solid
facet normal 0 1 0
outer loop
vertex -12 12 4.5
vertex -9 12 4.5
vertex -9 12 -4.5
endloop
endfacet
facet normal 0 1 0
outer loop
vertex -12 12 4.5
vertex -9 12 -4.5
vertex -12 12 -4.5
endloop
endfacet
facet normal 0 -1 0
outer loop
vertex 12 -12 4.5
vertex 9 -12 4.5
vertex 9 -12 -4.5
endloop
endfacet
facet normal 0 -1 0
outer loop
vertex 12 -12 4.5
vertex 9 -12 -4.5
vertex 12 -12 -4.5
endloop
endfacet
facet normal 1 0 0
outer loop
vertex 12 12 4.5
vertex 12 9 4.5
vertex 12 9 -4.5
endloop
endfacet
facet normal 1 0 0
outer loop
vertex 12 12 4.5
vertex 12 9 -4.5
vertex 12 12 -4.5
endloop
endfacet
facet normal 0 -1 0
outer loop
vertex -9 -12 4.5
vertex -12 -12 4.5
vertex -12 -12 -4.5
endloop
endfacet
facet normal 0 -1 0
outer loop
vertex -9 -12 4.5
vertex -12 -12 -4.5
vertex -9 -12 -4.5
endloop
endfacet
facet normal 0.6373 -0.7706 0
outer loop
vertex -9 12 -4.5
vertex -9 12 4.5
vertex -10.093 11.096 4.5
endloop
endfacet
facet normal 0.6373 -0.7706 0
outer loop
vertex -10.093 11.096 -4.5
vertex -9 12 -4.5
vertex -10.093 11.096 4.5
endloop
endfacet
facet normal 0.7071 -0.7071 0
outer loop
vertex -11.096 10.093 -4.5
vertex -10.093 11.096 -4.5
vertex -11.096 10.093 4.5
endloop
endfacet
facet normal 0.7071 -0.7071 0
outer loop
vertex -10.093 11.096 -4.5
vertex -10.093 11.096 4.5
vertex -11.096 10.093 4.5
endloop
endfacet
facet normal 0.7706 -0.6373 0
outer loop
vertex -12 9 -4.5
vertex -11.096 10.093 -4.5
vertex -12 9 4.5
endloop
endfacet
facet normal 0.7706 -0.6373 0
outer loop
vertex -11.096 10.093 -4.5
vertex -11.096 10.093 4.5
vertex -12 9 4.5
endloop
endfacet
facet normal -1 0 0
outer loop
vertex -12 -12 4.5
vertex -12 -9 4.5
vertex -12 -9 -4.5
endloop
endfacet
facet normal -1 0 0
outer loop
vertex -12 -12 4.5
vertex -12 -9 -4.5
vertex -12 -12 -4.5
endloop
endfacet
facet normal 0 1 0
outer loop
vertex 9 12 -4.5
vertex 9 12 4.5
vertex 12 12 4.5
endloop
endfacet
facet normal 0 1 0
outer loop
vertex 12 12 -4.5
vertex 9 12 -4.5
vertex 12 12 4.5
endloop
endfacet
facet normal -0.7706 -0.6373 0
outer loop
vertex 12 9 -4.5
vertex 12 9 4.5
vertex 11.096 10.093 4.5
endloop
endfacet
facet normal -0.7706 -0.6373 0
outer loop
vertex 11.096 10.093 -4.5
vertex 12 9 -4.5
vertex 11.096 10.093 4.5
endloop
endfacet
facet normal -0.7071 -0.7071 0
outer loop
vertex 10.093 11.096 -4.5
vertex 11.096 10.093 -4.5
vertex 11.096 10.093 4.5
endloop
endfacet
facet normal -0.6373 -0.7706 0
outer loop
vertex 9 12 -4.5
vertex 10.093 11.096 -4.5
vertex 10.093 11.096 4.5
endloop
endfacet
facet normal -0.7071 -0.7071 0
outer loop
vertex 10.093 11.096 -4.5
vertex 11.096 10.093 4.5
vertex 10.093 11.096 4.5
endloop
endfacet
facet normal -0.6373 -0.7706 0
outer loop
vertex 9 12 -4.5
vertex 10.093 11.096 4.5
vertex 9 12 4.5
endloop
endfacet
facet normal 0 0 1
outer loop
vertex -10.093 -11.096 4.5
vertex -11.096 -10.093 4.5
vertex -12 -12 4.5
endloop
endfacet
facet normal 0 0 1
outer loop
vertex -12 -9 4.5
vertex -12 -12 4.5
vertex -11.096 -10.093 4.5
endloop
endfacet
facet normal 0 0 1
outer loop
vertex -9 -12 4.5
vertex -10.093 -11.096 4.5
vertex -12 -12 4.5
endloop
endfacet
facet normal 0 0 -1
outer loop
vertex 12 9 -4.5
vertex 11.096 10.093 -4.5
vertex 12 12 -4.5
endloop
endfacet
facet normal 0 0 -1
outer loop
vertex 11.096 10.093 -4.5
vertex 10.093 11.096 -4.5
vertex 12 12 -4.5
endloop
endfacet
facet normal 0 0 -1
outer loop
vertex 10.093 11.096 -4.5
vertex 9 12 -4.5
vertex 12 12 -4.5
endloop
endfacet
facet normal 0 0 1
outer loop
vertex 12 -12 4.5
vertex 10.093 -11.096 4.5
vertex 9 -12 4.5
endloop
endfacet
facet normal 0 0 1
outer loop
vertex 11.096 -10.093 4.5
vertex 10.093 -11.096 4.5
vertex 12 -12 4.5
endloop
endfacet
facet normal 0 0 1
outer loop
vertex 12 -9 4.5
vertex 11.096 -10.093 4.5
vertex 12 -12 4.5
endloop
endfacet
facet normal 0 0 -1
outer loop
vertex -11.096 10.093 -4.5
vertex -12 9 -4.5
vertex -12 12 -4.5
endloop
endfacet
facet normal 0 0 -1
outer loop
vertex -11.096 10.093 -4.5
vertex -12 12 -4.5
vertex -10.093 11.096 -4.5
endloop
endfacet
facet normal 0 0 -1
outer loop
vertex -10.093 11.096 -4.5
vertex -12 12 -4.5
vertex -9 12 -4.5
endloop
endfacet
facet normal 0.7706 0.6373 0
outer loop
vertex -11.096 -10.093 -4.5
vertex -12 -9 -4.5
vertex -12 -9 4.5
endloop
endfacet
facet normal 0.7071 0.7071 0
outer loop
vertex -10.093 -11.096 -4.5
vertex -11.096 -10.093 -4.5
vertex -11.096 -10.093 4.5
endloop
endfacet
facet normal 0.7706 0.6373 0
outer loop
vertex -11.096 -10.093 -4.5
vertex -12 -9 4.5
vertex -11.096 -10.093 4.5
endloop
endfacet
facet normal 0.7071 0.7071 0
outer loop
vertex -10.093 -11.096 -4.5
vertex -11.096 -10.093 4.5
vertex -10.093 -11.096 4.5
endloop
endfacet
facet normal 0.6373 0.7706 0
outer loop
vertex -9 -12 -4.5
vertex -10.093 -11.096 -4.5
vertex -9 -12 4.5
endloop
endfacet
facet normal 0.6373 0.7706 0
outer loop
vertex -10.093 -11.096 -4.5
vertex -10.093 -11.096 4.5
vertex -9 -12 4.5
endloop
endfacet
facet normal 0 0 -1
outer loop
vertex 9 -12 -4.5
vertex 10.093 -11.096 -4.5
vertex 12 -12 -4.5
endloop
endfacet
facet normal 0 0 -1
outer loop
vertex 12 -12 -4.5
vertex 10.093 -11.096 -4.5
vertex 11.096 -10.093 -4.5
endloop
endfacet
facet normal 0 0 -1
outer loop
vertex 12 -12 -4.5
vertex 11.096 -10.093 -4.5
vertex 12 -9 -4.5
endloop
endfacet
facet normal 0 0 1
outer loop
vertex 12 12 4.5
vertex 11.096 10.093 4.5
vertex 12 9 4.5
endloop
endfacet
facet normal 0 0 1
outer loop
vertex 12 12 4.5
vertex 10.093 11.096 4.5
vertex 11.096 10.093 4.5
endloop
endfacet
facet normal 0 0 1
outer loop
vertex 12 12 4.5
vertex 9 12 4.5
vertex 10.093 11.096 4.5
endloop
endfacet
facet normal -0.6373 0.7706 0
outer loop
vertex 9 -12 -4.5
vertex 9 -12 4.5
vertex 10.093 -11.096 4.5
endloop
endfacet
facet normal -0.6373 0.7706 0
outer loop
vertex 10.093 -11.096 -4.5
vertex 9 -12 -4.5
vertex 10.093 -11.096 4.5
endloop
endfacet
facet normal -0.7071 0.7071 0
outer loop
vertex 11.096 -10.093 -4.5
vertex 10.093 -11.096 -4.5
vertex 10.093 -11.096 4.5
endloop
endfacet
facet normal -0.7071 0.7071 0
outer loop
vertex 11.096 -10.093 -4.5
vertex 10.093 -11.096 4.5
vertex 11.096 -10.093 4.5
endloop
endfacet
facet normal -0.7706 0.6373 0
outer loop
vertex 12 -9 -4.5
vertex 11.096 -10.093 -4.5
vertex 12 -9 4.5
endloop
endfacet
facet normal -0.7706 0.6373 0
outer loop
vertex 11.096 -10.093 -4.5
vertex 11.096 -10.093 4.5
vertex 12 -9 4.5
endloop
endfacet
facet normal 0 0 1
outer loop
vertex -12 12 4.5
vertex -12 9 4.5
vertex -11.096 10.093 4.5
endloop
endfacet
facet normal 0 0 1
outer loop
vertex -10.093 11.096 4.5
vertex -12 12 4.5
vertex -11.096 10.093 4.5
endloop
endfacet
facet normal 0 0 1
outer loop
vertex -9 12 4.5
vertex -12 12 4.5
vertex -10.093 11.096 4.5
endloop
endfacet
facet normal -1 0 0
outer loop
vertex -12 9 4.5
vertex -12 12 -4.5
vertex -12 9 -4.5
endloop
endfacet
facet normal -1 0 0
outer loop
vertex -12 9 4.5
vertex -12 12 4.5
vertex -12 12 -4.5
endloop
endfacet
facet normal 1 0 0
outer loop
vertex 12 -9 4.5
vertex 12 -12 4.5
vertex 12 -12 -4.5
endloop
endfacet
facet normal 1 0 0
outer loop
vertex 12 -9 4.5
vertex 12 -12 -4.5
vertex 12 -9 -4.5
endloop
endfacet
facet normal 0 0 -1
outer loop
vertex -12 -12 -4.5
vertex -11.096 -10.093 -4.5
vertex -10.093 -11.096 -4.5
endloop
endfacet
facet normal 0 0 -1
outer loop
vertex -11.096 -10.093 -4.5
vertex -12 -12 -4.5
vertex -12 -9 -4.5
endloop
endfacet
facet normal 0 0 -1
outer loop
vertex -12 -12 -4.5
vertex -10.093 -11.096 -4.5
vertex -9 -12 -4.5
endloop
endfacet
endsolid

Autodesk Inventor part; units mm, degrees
ref_plane "YZ Plane" through (0, 0, 0) normal (1, 0, 0) x (0, 1, 0)
ref_plane "XZ Plane" through (0, 0, 0) normal (0, 1, 0) x (-1, 0, 0)
ref_plane "XY Plane" through (0, 0, 0) normal (0, 0, 1) x (1, 0, 0)
sketch "スケッチ1" plane through (8.3334, 12.4721, 4.5) normal (0, 0, 1) x (1, 0, 0)
  circle A0 centre (-8.3334, -12.4721) radius 15
  line L0 (-8.3334, -12.4721) -> (-8.3334, -0.4721)
  line L1 (0.6666, -0.4721) -> (3.6666, -0.4721)
  line L2 (3.6666, -0.4721) -> (-8.3334, -0.4721)
  line L3 (-17.3334, -0.4721) -> (-20.3334, -0.4721)
  line L4 (3.6666, -24.4721) -> (3.6666, -21.4721)
  line L5 (3.6666, -3.4721) -> (3.6666, -0.4721)
  line L6 (-20.3334, -24.4721) -> (-17.3334, -24.4721)
  line L7 (0.6666, -24.4721) -> (3.6666, -24.4721)
  line L8 (-20.3334, -0.4721) -> (-20.3334, -3.4721)
  line L9 (-20.3334, -21.4721) -> (-20.3334, -24.4721)
  dimension "d4" = 30
  dimension "d7" = 12
  dimension "d8" = 12
  dimension "d9" = 24
  dimension "d10" = 24
extrude "押し出し2" add sketch "スケッチ1" against normal blind 9 contours A0 L1 L5 | L4 L7 A0 | A0 L8 L3 | L6 L9 A0
properties part number "bearing-gairin"
